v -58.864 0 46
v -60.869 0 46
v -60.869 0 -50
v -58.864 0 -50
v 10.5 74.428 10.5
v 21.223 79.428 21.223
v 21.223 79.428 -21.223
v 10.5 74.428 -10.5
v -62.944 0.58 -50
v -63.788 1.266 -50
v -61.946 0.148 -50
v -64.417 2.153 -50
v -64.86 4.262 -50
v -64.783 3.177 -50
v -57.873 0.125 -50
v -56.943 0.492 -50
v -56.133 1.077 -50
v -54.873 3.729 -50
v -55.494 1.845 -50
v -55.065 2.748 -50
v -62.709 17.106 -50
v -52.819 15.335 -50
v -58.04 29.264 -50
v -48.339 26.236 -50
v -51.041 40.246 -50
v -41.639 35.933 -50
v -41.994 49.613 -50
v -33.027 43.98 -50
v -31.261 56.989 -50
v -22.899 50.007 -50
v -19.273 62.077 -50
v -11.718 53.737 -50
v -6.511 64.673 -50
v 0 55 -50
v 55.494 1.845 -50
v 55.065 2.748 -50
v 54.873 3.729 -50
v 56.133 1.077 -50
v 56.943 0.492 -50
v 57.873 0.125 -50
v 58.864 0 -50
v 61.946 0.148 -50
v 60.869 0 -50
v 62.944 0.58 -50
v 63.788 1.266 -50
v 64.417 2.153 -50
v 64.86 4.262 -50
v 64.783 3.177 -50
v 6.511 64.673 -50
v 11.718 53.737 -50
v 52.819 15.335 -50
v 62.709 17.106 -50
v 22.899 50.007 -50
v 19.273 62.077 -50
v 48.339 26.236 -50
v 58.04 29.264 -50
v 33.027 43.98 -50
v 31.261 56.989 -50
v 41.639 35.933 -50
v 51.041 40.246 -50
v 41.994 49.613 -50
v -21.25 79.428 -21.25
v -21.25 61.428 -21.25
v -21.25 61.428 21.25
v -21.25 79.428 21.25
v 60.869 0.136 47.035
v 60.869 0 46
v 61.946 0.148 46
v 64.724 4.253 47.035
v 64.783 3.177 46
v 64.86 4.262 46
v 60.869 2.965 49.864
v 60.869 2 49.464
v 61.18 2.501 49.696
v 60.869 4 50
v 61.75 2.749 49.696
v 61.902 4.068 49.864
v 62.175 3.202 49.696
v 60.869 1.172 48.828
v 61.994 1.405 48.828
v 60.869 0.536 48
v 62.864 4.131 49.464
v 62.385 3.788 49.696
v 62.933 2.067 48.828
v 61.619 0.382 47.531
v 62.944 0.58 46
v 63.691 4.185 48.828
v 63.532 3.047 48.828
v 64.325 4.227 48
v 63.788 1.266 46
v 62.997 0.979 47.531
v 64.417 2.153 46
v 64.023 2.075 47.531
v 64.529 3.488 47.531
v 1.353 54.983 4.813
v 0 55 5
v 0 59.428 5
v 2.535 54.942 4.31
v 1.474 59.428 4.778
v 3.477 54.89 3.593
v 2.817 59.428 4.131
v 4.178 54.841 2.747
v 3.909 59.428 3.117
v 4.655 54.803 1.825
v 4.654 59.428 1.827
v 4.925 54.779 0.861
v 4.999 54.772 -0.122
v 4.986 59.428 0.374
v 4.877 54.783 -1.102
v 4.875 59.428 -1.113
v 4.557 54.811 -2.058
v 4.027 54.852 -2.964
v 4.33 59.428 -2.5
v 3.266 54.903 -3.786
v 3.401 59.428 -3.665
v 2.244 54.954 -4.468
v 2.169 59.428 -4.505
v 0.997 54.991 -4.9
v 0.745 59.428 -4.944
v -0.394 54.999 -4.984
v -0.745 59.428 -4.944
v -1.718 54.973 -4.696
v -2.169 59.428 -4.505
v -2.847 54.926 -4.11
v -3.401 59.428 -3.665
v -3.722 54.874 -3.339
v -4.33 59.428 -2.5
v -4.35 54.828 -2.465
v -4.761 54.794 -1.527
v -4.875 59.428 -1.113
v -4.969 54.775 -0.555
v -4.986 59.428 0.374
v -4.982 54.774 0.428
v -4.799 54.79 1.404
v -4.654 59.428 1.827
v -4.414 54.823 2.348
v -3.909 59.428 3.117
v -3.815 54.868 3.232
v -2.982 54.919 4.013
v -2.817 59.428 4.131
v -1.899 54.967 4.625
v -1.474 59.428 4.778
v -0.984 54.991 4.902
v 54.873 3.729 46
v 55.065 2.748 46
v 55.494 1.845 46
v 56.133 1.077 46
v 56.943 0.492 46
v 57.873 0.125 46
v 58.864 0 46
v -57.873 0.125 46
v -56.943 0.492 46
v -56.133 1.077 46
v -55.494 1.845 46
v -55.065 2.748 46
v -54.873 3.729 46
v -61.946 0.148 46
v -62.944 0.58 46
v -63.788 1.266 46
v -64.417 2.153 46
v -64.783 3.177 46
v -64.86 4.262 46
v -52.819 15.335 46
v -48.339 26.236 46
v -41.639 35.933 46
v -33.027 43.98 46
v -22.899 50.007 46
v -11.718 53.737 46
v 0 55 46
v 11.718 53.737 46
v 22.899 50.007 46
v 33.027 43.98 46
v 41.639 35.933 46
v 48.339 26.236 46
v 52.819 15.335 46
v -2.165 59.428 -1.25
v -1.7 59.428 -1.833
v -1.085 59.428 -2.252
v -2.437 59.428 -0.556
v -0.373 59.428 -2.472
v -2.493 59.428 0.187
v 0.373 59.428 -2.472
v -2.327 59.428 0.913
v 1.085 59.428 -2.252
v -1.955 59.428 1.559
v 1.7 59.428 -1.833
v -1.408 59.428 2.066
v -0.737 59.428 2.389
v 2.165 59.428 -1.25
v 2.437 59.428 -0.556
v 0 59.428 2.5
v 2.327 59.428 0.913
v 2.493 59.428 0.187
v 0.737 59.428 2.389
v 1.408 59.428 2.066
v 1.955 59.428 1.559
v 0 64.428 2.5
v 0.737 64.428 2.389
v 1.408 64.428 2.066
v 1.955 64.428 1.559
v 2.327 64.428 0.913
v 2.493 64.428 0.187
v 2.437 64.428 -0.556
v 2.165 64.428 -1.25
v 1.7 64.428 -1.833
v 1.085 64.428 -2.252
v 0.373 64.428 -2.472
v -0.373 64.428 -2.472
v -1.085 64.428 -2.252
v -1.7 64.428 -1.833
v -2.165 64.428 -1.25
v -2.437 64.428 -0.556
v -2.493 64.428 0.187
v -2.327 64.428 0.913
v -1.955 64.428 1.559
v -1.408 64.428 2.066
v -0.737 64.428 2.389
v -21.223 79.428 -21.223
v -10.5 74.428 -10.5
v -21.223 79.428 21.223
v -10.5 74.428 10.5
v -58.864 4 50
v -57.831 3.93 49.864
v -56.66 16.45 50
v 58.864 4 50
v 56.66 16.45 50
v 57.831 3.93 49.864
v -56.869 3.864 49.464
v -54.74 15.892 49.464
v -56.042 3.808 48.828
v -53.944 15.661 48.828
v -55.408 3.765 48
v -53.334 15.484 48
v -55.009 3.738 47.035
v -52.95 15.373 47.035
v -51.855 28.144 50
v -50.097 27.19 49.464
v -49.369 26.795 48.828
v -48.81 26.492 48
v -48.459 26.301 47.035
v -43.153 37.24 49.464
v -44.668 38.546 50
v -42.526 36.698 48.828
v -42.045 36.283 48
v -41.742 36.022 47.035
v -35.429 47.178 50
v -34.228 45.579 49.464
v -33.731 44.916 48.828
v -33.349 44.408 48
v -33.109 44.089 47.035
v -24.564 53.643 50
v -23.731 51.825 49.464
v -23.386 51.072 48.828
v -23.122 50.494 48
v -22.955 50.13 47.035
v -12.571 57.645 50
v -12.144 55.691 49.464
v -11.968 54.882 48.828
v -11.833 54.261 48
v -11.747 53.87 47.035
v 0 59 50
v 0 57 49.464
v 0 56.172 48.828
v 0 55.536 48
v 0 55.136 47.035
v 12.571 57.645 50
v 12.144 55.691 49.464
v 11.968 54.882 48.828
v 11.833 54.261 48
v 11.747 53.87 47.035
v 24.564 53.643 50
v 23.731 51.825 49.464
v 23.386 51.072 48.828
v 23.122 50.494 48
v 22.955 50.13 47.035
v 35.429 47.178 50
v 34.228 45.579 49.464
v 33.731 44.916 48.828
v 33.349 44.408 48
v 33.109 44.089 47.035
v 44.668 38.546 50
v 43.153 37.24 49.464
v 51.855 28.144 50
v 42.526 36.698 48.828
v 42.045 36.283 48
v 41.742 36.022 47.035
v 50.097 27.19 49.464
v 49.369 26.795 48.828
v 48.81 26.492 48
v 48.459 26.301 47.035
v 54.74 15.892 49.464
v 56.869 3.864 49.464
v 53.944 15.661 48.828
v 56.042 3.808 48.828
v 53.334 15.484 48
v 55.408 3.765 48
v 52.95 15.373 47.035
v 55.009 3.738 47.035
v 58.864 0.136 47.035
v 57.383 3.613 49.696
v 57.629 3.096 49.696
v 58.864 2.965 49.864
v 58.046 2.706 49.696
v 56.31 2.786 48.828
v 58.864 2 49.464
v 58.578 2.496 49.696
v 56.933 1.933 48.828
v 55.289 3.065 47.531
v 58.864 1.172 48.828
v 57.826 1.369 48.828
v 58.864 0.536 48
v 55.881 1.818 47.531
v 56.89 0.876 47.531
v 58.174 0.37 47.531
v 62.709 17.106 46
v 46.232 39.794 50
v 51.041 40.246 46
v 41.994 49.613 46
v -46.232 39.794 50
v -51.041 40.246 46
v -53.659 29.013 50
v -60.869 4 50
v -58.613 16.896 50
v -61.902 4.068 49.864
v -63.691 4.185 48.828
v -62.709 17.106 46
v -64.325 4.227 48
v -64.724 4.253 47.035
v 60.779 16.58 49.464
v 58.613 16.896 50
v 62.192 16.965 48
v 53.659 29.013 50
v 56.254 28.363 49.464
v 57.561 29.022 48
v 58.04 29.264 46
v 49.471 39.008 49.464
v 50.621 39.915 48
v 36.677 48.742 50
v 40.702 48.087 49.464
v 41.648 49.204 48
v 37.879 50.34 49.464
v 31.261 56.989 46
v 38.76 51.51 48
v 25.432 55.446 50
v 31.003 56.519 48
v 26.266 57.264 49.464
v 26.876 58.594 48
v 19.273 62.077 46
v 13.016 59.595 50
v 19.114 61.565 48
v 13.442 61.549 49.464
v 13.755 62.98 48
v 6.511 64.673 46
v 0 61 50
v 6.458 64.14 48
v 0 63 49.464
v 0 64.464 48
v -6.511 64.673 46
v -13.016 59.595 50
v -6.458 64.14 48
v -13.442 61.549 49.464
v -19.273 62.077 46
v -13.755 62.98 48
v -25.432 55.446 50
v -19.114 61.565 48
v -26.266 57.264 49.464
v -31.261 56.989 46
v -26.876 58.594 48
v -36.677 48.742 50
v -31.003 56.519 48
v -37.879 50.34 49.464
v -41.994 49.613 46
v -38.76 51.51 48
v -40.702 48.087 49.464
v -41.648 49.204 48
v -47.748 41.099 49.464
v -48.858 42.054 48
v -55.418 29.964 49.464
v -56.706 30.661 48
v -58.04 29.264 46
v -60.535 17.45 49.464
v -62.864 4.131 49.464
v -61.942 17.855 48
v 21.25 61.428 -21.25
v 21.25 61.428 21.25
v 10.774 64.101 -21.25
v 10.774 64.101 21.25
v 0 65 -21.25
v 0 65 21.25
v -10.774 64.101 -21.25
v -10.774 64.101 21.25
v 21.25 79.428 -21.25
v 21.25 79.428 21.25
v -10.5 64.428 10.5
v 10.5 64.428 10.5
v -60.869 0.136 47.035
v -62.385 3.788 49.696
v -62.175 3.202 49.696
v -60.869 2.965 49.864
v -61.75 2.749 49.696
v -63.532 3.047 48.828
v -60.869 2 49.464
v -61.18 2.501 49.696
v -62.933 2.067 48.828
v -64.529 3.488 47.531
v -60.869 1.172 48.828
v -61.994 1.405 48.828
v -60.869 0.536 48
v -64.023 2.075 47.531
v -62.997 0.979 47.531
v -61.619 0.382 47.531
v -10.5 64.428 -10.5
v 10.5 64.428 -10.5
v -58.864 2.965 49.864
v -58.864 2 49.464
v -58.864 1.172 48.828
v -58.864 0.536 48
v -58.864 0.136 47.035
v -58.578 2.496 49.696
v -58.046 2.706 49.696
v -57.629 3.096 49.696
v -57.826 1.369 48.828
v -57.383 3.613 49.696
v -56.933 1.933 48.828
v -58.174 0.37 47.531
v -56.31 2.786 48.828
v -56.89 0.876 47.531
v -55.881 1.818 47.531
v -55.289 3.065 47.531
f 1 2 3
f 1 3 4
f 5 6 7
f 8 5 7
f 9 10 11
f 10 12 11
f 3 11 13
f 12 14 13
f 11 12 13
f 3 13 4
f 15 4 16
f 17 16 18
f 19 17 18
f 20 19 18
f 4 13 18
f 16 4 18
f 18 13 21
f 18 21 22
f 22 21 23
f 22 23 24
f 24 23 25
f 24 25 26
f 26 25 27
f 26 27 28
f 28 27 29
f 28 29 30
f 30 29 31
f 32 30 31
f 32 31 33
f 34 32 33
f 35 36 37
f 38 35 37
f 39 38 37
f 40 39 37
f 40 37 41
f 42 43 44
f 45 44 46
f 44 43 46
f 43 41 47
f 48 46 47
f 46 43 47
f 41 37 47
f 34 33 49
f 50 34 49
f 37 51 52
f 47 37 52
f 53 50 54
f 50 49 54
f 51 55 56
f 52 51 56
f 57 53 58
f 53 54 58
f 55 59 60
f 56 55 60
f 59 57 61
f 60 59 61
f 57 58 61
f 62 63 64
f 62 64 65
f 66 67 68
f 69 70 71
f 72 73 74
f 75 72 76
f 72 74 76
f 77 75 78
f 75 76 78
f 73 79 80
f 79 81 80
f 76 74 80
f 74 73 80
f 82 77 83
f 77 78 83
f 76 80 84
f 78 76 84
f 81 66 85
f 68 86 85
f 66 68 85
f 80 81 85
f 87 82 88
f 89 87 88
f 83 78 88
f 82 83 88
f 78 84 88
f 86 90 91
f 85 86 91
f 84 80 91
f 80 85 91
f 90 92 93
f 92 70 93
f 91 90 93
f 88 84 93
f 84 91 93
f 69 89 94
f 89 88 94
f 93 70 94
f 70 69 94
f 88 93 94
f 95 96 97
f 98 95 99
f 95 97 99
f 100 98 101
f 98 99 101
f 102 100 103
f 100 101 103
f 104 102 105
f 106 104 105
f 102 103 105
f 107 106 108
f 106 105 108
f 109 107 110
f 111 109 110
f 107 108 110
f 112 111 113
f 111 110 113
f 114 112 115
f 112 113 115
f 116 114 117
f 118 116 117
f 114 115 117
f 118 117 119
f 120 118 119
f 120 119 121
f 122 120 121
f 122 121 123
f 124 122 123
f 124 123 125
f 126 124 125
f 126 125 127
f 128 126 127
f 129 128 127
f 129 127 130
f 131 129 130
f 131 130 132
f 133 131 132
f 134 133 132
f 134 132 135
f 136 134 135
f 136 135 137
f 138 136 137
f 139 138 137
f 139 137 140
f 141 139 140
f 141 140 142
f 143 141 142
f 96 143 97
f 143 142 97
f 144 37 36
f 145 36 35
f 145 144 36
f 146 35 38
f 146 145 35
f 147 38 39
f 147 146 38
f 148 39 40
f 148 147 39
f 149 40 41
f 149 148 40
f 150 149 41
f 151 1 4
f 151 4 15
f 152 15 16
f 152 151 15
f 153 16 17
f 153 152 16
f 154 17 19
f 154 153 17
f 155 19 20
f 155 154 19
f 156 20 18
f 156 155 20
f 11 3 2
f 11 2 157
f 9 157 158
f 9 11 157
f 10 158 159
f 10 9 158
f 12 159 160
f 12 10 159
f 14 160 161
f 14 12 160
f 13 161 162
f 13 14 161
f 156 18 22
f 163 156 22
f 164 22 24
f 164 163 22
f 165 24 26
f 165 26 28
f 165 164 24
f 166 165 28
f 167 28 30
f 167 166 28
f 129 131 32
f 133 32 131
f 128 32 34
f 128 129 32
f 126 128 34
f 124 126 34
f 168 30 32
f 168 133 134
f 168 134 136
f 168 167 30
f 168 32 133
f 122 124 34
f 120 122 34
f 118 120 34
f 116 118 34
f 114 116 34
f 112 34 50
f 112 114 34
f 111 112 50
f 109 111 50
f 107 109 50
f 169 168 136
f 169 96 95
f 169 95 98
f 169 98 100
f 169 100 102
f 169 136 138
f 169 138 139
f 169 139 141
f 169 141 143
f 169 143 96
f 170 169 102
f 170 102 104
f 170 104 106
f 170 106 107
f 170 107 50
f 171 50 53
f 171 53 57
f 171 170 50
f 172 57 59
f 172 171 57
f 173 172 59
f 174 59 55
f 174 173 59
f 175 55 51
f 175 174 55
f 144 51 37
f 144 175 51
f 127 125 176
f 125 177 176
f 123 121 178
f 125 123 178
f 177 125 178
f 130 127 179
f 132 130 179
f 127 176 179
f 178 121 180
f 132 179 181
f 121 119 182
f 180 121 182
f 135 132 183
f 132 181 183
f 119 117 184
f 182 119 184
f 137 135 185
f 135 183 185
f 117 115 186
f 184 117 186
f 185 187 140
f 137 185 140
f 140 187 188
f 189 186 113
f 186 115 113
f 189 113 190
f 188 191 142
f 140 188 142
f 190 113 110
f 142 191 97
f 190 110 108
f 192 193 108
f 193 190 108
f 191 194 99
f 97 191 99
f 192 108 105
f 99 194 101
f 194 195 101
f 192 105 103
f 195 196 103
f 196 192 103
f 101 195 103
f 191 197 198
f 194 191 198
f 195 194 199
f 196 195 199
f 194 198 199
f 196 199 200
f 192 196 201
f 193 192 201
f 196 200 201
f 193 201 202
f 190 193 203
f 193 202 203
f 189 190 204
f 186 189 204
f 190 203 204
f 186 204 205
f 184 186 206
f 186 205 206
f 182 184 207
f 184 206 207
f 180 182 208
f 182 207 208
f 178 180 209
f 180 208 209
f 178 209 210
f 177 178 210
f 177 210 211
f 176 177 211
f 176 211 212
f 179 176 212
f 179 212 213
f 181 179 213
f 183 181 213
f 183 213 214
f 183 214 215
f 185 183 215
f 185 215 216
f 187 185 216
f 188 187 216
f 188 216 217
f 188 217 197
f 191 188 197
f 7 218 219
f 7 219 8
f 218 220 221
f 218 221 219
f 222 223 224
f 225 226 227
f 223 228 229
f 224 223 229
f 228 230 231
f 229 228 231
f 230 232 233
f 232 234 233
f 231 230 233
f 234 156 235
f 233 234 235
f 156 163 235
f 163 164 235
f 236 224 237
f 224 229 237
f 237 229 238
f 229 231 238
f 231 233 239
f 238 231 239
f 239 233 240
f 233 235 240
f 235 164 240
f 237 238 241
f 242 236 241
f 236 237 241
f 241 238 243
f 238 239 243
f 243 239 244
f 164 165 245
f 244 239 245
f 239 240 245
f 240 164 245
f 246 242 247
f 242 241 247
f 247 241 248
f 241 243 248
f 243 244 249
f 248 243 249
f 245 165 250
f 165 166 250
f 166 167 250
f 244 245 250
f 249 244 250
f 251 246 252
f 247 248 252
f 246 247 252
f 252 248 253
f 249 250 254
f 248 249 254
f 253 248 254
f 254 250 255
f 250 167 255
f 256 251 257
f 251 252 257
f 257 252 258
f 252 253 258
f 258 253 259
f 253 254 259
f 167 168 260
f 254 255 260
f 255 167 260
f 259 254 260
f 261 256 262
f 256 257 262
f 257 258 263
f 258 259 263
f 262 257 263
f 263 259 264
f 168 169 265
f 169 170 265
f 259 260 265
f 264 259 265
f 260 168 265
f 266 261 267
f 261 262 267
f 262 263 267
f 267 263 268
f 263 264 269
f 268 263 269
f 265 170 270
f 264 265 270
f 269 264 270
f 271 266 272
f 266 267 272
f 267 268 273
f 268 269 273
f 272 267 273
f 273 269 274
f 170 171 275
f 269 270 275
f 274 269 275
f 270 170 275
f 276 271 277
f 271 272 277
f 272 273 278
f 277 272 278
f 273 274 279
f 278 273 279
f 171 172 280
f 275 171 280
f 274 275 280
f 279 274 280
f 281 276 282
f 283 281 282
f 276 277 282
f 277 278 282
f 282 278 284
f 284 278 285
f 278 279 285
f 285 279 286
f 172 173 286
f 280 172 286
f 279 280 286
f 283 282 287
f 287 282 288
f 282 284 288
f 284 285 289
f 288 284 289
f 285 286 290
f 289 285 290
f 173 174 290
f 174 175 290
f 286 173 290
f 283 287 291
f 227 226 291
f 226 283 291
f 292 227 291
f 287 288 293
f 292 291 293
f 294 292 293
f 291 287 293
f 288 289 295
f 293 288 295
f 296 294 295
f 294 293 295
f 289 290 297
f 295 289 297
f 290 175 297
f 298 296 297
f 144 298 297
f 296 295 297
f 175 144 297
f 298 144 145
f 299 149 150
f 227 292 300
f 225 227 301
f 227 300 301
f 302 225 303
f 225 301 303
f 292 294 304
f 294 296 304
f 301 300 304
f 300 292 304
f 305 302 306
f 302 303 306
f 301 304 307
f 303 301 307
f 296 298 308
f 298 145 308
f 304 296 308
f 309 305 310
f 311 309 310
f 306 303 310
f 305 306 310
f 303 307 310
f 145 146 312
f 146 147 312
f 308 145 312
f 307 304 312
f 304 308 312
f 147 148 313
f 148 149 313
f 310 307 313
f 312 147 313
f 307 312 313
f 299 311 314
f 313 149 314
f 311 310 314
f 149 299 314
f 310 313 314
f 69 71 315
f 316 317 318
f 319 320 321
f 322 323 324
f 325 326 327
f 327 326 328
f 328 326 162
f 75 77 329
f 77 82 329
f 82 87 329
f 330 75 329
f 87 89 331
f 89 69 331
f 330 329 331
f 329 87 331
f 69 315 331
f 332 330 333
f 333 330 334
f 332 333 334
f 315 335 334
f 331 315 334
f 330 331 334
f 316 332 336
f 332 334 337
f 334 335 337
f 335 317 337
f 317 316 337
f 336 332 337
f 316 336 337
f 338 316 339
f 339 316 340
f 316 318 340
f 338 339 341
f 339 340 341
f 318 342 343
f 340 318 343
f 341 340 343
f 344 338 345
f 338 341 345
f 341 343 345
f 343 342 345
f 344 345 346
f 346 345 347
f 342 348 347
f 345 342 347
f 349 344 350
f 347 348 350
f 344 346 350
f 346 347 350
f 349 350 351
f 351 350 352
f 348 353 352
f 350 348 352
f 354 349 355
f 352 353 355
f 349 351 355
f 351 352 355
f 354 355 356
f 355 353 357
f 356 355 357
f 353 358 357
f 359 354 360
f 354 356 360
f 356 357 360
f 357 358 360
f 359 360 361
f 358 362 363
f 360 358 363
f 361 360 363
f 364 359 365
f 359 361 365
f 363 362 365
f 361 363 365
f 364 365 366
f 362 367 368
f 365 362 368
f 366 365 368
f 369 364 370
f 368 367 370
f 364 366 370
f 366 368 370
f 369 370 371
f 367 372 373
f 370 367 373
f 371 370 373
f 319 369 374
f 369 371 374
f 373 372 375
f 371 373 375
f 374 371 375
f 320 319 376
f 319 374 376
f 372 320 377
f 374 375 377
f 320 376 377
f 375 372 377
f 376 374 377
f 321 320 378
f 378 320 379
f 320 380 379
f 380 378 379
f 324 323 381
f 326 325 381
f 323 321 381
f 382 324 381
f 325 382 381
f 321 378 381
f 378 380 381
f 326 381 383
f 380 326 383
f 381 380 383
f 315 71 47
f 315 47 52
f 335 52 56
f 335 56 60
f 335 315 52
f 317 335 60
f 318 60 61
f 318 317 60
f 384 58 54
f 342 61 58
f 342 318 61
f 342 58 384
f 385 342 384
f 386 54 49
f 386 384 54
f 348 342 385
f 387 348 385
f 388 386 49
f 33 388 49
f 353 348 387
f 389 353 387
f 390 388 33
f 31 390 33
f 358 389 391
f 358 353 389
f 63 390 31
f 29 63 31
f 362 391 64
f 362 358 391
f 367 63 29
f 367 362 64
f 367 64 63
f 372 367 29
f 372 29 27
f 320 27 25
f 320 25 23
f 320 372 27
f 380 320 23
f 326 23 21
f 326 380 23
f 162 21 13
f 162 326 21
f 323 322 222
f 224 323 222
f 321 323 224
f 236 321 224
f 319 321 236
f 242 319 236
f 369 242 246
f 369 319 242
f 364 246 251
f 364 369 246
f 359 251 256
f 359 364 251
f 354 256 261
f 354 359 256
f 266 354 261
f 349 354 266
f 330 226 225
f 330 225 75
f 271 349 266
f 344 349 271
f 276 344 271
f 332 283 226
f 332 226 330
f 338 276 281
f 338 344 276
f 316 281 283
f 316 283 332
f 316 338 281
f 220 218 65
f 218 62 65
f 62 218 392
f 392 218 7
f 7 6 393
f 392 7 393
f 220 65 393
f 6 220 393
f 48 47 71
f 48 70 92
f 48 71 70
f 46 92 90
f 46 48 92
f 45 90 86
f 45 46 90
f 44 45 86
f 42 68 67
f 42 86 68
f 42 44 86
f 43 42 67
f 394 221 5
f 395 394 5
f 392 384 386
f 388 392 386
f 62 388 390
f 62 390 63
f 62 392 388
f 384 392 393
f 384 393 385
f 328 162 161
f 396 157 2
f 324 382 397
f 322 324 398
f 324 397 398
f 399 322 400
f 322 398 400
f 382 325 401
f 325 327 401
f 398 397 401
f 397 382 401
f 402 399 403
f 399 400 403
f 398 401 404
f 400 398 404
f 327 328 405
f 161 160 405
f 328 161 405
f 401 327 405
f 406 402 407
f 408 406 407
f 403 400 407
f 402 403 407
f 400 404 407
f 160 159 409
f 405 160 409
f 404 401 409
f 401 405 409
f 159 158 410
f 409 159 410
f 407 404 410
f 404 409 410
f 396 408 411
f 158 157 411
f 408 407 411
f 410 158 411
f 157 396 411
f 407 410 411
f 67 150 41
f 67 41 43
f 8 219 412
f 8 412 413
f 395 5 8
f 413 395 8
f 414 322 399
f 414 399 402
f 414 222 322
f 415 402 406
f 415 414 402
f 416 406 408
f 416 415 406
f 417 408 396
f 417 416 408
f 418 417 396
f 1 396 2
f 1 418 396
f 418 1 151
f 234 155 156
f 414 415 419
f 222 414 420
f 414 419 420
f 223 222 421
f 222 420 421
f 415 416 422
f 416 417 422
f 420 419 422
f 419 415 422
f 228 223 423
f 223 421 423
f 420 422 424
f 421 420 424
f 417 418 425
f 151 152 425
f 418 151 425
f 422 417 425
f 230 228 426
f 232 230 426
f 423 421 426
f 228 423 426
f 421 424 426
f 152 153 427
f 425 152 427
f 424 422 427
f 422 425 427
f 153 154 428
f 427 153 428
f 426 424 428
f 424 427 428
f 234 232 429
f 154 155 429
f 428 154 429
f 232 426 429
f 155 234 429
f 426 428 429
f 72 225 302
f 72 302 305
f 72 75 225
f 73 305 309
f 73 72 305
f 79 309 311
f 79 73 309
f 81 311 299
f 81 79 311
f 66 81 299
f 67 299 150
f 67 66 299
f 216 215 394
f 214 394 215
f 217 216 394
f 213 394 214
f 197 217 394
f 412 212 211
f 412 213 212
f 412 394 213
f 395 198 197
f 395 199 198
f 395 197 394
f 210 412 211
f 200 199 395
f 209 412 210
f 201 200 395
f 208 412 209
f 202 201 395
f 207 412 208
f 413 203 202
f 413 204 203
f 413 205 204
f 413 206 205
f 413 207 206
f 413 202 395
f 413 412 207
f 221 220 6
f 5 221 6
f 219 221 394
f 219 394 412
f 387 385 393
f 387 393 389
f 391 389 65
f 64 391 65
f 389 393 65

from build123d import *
from OCP.BRepFilletAPI import BRepFilletAPI_MakeChamfer

# Parameters (mm, degrees)
BOSS_EXTRUDE1_DEPTH = 50
BOSS_EXTRUDE2_DEPTH = 21.25
FILLET1_R           = 4
FILLET2_R           = 4
SKETCH3_W           = 21
SKETCH3_H           = 21
CUT_EXTRUDE1_DEPTH  = 15
CHAMFER1_SIZE       = 5
CHAMFER1_SIZE2      = 10.722534603
SKETCH4_R           = 2.5
CUT_EXTRUDE2_DEPTH  = 105.206319677
CUT_EXTRUDE3_START  = -5
SKETCH5_R           = 5
CUT_EXTRUDE3_DEPTH  = 100.206319725


with BuildPart() as part:
    # Sketch1 → Boss-Extrude1 (new, symmetric)
    with BuildSketch(Plane.XY):
        with BuildLine():
            Line((-65, 0), (-55, 0))
            ThreePointArc((-55, 0), (0, 55), (55, 0))
            Line((55, 0), (65, 0))
            ThreePointArc((65, 0), (0, 65), (-65, 0))
        make_face()
    extrude(amount=BOSS_EXTRUDE1_DEPTH, both=True)

    # Sketch2 → Boss-Extrude2 (add, symmetric)
    with BuildSketch(Plane.XY):
        with BuildLine():
            Line((-21.25, 61.428311877), (-21.25, 79.428311877))
            Line((-21.25, 79.428311877), (21.25, 79.428311877))
            Line((21.25, 79.428311877), (21.25, 61.428311877))
            ThreePointArc((21.25, 61.428311877), (0, 65), (-21.25, 61.428311877))
        make_face()
    extrude(amount=BOSS_EXTRUDE2_DEPTH, both=True)

    # Fillet1
    fillet1_edges = [part.edges().sort_by_distance(p)[0] for p in [
        (-55, 0, 0),
        (-65, 0, 0),
        (65, 0, 0),
        (55, 0, 0),
    ]]
    fillet(fillet1_edges, radius=FILLET1_R)

    # Fillet2
    fillet2_edges = [part.edges().sort_by_distance(p)[0] for p in [
        (0, 65, 50),
        (59.866480893, 0, 50),
        (0, 55, 50),
        (-59.866480893, 0, 50),
        (-63.788401254, 1.265880428, 50),
        (-56.133384976, 1.077266197, 50),
        (56.133384976, 1.077266197, 50),
        (63.788401254, 1.265880428, 50),
    ]]
    fillet(fillet2_edges, radius=FILLET2_R)

    # Sketch3 → Cut-Extrude1 (cut)
    with BuildSketch(Plane(origin=(0, 79.428311877, 0), x_dir=(1, 0, 0), z_dir=(0, 1, 0))):
        Rectangle(SKETCH3_W, SKETCH3_H)
    extrude(amount=-CUT_EXTRUDE1_DEPTH, mode=Mode.SUBTRACT)

    # Chamfer1: one chamfer whose edges measure the first distance from different faces: ONE call of the kernel's chamfer builder (chamfer() names one face for all edges)
    chamfer1_edges_1 = [part.edges().sort_by_distance(p)[0] for p in [
        (10.5, 79.428311877, 0),
    ]]
    chamfer1_side_1 = [part.faces().sort_by_distance(p)[0] for p in [
        (10.5, 71.928311877, 0),
    ]]
    chamfer1_edges_2 = [part.edges().sort_by_distance(p)[0] for p in [
        (0, 79.428311877, -10.5),
    ]]
    chamfer1_side_2 = [part.faces().sort_by_distance(p)[0] for p in [
        (0, 71.928311877, -10.5),
    ]]
    chamfer1_edges_3 = [part.edges().sort_by_distance(p)[0] for p in [
        (-10.5, 79.428311877, 0),
    ]]
    chamfer1_side_3 = [part.faces().sort_by_distance(p)[0] for p in [
        (-10.5, 71.928311877, 0),
    ]]
    chamfer1_edges_4 = [part.edges().sort_by_distance(p)[0] for p in [
        (0, 79.428311877, 10.5),
    ]]
    chamfer1_side_4 = [part.faces().sort_by_distance(p)[0] for p in [
        (0, 71.928311877, 10.5),
    ]]
    chamfer1 = BRepFilletAPI_MakeChamfer(part.part.solid().wrapped)
    for e in chamfer1_edges_1:
        chamfer1.Add(CHAMFER1_SIZE, CHAMFER1_SIZE2, e.wrapped, chamfer1_side_1[0].wrapped)  # the first distance lies on this face
    for e in chamfer1_edges_2:
        chamfer1.Add(CHAMFER1_SIZE, CHAMFER1_SIZE2, e.wrapped, chamfer1_side_2[0].wrapped)  # the first distance lies on this face
    for e in chamfer1_edges_3:
        chamfer1.Add(CHAMFER1_SIZE, CHAMFER1_SIZE2, e.wrapped, chamfer1_side_3[0].wrapped)  # the first distance lies on this face
    for e in chamfer1_edges_4:
        chamfer1.Add(CHAMFER1_SIZE, CHAMFER1_SIZE2, e.wrapped, chamfer1_side_4[0].wrapped)  # the first distance lies on this face
    add(Compound.cast(chamfer1.Shape()), mode=Mode.REPLACE)

    # Sketch4 → Cut-Extrude2 (cut, through all)
    with BuildSketch(Plane(origin=(0, 64.428311877, 0), x_dir=(1, 0, 0), z_dir=(0, 1, 0))):
        with Locations(Location((0, 0, 0), (0, 0, 270))):
            Circle(SKETCH4_R)
    extrude(amount=-CUT_EXTRUDE2_DEPTH, mode=Mode.SUBTRACT)

    # Sketch5 → Cut-Extrude3 (cut, through all)
    with BuildSketch(Plane(origin=(0, 64.428311877, 0), x_dir=(1, 0, 0), z_dir=(0, 1, 0)).offset(CUT_EXTRUDE3_START)):
        with Locations(Location((0, 0, 0), (0, 0, 270))):
            Circle(SKETCH5_R)
    extrude(amount=-CUT_EXTRUDE3_DEPTH, mode=Mode.SUBTRACT)


solid = part.part
